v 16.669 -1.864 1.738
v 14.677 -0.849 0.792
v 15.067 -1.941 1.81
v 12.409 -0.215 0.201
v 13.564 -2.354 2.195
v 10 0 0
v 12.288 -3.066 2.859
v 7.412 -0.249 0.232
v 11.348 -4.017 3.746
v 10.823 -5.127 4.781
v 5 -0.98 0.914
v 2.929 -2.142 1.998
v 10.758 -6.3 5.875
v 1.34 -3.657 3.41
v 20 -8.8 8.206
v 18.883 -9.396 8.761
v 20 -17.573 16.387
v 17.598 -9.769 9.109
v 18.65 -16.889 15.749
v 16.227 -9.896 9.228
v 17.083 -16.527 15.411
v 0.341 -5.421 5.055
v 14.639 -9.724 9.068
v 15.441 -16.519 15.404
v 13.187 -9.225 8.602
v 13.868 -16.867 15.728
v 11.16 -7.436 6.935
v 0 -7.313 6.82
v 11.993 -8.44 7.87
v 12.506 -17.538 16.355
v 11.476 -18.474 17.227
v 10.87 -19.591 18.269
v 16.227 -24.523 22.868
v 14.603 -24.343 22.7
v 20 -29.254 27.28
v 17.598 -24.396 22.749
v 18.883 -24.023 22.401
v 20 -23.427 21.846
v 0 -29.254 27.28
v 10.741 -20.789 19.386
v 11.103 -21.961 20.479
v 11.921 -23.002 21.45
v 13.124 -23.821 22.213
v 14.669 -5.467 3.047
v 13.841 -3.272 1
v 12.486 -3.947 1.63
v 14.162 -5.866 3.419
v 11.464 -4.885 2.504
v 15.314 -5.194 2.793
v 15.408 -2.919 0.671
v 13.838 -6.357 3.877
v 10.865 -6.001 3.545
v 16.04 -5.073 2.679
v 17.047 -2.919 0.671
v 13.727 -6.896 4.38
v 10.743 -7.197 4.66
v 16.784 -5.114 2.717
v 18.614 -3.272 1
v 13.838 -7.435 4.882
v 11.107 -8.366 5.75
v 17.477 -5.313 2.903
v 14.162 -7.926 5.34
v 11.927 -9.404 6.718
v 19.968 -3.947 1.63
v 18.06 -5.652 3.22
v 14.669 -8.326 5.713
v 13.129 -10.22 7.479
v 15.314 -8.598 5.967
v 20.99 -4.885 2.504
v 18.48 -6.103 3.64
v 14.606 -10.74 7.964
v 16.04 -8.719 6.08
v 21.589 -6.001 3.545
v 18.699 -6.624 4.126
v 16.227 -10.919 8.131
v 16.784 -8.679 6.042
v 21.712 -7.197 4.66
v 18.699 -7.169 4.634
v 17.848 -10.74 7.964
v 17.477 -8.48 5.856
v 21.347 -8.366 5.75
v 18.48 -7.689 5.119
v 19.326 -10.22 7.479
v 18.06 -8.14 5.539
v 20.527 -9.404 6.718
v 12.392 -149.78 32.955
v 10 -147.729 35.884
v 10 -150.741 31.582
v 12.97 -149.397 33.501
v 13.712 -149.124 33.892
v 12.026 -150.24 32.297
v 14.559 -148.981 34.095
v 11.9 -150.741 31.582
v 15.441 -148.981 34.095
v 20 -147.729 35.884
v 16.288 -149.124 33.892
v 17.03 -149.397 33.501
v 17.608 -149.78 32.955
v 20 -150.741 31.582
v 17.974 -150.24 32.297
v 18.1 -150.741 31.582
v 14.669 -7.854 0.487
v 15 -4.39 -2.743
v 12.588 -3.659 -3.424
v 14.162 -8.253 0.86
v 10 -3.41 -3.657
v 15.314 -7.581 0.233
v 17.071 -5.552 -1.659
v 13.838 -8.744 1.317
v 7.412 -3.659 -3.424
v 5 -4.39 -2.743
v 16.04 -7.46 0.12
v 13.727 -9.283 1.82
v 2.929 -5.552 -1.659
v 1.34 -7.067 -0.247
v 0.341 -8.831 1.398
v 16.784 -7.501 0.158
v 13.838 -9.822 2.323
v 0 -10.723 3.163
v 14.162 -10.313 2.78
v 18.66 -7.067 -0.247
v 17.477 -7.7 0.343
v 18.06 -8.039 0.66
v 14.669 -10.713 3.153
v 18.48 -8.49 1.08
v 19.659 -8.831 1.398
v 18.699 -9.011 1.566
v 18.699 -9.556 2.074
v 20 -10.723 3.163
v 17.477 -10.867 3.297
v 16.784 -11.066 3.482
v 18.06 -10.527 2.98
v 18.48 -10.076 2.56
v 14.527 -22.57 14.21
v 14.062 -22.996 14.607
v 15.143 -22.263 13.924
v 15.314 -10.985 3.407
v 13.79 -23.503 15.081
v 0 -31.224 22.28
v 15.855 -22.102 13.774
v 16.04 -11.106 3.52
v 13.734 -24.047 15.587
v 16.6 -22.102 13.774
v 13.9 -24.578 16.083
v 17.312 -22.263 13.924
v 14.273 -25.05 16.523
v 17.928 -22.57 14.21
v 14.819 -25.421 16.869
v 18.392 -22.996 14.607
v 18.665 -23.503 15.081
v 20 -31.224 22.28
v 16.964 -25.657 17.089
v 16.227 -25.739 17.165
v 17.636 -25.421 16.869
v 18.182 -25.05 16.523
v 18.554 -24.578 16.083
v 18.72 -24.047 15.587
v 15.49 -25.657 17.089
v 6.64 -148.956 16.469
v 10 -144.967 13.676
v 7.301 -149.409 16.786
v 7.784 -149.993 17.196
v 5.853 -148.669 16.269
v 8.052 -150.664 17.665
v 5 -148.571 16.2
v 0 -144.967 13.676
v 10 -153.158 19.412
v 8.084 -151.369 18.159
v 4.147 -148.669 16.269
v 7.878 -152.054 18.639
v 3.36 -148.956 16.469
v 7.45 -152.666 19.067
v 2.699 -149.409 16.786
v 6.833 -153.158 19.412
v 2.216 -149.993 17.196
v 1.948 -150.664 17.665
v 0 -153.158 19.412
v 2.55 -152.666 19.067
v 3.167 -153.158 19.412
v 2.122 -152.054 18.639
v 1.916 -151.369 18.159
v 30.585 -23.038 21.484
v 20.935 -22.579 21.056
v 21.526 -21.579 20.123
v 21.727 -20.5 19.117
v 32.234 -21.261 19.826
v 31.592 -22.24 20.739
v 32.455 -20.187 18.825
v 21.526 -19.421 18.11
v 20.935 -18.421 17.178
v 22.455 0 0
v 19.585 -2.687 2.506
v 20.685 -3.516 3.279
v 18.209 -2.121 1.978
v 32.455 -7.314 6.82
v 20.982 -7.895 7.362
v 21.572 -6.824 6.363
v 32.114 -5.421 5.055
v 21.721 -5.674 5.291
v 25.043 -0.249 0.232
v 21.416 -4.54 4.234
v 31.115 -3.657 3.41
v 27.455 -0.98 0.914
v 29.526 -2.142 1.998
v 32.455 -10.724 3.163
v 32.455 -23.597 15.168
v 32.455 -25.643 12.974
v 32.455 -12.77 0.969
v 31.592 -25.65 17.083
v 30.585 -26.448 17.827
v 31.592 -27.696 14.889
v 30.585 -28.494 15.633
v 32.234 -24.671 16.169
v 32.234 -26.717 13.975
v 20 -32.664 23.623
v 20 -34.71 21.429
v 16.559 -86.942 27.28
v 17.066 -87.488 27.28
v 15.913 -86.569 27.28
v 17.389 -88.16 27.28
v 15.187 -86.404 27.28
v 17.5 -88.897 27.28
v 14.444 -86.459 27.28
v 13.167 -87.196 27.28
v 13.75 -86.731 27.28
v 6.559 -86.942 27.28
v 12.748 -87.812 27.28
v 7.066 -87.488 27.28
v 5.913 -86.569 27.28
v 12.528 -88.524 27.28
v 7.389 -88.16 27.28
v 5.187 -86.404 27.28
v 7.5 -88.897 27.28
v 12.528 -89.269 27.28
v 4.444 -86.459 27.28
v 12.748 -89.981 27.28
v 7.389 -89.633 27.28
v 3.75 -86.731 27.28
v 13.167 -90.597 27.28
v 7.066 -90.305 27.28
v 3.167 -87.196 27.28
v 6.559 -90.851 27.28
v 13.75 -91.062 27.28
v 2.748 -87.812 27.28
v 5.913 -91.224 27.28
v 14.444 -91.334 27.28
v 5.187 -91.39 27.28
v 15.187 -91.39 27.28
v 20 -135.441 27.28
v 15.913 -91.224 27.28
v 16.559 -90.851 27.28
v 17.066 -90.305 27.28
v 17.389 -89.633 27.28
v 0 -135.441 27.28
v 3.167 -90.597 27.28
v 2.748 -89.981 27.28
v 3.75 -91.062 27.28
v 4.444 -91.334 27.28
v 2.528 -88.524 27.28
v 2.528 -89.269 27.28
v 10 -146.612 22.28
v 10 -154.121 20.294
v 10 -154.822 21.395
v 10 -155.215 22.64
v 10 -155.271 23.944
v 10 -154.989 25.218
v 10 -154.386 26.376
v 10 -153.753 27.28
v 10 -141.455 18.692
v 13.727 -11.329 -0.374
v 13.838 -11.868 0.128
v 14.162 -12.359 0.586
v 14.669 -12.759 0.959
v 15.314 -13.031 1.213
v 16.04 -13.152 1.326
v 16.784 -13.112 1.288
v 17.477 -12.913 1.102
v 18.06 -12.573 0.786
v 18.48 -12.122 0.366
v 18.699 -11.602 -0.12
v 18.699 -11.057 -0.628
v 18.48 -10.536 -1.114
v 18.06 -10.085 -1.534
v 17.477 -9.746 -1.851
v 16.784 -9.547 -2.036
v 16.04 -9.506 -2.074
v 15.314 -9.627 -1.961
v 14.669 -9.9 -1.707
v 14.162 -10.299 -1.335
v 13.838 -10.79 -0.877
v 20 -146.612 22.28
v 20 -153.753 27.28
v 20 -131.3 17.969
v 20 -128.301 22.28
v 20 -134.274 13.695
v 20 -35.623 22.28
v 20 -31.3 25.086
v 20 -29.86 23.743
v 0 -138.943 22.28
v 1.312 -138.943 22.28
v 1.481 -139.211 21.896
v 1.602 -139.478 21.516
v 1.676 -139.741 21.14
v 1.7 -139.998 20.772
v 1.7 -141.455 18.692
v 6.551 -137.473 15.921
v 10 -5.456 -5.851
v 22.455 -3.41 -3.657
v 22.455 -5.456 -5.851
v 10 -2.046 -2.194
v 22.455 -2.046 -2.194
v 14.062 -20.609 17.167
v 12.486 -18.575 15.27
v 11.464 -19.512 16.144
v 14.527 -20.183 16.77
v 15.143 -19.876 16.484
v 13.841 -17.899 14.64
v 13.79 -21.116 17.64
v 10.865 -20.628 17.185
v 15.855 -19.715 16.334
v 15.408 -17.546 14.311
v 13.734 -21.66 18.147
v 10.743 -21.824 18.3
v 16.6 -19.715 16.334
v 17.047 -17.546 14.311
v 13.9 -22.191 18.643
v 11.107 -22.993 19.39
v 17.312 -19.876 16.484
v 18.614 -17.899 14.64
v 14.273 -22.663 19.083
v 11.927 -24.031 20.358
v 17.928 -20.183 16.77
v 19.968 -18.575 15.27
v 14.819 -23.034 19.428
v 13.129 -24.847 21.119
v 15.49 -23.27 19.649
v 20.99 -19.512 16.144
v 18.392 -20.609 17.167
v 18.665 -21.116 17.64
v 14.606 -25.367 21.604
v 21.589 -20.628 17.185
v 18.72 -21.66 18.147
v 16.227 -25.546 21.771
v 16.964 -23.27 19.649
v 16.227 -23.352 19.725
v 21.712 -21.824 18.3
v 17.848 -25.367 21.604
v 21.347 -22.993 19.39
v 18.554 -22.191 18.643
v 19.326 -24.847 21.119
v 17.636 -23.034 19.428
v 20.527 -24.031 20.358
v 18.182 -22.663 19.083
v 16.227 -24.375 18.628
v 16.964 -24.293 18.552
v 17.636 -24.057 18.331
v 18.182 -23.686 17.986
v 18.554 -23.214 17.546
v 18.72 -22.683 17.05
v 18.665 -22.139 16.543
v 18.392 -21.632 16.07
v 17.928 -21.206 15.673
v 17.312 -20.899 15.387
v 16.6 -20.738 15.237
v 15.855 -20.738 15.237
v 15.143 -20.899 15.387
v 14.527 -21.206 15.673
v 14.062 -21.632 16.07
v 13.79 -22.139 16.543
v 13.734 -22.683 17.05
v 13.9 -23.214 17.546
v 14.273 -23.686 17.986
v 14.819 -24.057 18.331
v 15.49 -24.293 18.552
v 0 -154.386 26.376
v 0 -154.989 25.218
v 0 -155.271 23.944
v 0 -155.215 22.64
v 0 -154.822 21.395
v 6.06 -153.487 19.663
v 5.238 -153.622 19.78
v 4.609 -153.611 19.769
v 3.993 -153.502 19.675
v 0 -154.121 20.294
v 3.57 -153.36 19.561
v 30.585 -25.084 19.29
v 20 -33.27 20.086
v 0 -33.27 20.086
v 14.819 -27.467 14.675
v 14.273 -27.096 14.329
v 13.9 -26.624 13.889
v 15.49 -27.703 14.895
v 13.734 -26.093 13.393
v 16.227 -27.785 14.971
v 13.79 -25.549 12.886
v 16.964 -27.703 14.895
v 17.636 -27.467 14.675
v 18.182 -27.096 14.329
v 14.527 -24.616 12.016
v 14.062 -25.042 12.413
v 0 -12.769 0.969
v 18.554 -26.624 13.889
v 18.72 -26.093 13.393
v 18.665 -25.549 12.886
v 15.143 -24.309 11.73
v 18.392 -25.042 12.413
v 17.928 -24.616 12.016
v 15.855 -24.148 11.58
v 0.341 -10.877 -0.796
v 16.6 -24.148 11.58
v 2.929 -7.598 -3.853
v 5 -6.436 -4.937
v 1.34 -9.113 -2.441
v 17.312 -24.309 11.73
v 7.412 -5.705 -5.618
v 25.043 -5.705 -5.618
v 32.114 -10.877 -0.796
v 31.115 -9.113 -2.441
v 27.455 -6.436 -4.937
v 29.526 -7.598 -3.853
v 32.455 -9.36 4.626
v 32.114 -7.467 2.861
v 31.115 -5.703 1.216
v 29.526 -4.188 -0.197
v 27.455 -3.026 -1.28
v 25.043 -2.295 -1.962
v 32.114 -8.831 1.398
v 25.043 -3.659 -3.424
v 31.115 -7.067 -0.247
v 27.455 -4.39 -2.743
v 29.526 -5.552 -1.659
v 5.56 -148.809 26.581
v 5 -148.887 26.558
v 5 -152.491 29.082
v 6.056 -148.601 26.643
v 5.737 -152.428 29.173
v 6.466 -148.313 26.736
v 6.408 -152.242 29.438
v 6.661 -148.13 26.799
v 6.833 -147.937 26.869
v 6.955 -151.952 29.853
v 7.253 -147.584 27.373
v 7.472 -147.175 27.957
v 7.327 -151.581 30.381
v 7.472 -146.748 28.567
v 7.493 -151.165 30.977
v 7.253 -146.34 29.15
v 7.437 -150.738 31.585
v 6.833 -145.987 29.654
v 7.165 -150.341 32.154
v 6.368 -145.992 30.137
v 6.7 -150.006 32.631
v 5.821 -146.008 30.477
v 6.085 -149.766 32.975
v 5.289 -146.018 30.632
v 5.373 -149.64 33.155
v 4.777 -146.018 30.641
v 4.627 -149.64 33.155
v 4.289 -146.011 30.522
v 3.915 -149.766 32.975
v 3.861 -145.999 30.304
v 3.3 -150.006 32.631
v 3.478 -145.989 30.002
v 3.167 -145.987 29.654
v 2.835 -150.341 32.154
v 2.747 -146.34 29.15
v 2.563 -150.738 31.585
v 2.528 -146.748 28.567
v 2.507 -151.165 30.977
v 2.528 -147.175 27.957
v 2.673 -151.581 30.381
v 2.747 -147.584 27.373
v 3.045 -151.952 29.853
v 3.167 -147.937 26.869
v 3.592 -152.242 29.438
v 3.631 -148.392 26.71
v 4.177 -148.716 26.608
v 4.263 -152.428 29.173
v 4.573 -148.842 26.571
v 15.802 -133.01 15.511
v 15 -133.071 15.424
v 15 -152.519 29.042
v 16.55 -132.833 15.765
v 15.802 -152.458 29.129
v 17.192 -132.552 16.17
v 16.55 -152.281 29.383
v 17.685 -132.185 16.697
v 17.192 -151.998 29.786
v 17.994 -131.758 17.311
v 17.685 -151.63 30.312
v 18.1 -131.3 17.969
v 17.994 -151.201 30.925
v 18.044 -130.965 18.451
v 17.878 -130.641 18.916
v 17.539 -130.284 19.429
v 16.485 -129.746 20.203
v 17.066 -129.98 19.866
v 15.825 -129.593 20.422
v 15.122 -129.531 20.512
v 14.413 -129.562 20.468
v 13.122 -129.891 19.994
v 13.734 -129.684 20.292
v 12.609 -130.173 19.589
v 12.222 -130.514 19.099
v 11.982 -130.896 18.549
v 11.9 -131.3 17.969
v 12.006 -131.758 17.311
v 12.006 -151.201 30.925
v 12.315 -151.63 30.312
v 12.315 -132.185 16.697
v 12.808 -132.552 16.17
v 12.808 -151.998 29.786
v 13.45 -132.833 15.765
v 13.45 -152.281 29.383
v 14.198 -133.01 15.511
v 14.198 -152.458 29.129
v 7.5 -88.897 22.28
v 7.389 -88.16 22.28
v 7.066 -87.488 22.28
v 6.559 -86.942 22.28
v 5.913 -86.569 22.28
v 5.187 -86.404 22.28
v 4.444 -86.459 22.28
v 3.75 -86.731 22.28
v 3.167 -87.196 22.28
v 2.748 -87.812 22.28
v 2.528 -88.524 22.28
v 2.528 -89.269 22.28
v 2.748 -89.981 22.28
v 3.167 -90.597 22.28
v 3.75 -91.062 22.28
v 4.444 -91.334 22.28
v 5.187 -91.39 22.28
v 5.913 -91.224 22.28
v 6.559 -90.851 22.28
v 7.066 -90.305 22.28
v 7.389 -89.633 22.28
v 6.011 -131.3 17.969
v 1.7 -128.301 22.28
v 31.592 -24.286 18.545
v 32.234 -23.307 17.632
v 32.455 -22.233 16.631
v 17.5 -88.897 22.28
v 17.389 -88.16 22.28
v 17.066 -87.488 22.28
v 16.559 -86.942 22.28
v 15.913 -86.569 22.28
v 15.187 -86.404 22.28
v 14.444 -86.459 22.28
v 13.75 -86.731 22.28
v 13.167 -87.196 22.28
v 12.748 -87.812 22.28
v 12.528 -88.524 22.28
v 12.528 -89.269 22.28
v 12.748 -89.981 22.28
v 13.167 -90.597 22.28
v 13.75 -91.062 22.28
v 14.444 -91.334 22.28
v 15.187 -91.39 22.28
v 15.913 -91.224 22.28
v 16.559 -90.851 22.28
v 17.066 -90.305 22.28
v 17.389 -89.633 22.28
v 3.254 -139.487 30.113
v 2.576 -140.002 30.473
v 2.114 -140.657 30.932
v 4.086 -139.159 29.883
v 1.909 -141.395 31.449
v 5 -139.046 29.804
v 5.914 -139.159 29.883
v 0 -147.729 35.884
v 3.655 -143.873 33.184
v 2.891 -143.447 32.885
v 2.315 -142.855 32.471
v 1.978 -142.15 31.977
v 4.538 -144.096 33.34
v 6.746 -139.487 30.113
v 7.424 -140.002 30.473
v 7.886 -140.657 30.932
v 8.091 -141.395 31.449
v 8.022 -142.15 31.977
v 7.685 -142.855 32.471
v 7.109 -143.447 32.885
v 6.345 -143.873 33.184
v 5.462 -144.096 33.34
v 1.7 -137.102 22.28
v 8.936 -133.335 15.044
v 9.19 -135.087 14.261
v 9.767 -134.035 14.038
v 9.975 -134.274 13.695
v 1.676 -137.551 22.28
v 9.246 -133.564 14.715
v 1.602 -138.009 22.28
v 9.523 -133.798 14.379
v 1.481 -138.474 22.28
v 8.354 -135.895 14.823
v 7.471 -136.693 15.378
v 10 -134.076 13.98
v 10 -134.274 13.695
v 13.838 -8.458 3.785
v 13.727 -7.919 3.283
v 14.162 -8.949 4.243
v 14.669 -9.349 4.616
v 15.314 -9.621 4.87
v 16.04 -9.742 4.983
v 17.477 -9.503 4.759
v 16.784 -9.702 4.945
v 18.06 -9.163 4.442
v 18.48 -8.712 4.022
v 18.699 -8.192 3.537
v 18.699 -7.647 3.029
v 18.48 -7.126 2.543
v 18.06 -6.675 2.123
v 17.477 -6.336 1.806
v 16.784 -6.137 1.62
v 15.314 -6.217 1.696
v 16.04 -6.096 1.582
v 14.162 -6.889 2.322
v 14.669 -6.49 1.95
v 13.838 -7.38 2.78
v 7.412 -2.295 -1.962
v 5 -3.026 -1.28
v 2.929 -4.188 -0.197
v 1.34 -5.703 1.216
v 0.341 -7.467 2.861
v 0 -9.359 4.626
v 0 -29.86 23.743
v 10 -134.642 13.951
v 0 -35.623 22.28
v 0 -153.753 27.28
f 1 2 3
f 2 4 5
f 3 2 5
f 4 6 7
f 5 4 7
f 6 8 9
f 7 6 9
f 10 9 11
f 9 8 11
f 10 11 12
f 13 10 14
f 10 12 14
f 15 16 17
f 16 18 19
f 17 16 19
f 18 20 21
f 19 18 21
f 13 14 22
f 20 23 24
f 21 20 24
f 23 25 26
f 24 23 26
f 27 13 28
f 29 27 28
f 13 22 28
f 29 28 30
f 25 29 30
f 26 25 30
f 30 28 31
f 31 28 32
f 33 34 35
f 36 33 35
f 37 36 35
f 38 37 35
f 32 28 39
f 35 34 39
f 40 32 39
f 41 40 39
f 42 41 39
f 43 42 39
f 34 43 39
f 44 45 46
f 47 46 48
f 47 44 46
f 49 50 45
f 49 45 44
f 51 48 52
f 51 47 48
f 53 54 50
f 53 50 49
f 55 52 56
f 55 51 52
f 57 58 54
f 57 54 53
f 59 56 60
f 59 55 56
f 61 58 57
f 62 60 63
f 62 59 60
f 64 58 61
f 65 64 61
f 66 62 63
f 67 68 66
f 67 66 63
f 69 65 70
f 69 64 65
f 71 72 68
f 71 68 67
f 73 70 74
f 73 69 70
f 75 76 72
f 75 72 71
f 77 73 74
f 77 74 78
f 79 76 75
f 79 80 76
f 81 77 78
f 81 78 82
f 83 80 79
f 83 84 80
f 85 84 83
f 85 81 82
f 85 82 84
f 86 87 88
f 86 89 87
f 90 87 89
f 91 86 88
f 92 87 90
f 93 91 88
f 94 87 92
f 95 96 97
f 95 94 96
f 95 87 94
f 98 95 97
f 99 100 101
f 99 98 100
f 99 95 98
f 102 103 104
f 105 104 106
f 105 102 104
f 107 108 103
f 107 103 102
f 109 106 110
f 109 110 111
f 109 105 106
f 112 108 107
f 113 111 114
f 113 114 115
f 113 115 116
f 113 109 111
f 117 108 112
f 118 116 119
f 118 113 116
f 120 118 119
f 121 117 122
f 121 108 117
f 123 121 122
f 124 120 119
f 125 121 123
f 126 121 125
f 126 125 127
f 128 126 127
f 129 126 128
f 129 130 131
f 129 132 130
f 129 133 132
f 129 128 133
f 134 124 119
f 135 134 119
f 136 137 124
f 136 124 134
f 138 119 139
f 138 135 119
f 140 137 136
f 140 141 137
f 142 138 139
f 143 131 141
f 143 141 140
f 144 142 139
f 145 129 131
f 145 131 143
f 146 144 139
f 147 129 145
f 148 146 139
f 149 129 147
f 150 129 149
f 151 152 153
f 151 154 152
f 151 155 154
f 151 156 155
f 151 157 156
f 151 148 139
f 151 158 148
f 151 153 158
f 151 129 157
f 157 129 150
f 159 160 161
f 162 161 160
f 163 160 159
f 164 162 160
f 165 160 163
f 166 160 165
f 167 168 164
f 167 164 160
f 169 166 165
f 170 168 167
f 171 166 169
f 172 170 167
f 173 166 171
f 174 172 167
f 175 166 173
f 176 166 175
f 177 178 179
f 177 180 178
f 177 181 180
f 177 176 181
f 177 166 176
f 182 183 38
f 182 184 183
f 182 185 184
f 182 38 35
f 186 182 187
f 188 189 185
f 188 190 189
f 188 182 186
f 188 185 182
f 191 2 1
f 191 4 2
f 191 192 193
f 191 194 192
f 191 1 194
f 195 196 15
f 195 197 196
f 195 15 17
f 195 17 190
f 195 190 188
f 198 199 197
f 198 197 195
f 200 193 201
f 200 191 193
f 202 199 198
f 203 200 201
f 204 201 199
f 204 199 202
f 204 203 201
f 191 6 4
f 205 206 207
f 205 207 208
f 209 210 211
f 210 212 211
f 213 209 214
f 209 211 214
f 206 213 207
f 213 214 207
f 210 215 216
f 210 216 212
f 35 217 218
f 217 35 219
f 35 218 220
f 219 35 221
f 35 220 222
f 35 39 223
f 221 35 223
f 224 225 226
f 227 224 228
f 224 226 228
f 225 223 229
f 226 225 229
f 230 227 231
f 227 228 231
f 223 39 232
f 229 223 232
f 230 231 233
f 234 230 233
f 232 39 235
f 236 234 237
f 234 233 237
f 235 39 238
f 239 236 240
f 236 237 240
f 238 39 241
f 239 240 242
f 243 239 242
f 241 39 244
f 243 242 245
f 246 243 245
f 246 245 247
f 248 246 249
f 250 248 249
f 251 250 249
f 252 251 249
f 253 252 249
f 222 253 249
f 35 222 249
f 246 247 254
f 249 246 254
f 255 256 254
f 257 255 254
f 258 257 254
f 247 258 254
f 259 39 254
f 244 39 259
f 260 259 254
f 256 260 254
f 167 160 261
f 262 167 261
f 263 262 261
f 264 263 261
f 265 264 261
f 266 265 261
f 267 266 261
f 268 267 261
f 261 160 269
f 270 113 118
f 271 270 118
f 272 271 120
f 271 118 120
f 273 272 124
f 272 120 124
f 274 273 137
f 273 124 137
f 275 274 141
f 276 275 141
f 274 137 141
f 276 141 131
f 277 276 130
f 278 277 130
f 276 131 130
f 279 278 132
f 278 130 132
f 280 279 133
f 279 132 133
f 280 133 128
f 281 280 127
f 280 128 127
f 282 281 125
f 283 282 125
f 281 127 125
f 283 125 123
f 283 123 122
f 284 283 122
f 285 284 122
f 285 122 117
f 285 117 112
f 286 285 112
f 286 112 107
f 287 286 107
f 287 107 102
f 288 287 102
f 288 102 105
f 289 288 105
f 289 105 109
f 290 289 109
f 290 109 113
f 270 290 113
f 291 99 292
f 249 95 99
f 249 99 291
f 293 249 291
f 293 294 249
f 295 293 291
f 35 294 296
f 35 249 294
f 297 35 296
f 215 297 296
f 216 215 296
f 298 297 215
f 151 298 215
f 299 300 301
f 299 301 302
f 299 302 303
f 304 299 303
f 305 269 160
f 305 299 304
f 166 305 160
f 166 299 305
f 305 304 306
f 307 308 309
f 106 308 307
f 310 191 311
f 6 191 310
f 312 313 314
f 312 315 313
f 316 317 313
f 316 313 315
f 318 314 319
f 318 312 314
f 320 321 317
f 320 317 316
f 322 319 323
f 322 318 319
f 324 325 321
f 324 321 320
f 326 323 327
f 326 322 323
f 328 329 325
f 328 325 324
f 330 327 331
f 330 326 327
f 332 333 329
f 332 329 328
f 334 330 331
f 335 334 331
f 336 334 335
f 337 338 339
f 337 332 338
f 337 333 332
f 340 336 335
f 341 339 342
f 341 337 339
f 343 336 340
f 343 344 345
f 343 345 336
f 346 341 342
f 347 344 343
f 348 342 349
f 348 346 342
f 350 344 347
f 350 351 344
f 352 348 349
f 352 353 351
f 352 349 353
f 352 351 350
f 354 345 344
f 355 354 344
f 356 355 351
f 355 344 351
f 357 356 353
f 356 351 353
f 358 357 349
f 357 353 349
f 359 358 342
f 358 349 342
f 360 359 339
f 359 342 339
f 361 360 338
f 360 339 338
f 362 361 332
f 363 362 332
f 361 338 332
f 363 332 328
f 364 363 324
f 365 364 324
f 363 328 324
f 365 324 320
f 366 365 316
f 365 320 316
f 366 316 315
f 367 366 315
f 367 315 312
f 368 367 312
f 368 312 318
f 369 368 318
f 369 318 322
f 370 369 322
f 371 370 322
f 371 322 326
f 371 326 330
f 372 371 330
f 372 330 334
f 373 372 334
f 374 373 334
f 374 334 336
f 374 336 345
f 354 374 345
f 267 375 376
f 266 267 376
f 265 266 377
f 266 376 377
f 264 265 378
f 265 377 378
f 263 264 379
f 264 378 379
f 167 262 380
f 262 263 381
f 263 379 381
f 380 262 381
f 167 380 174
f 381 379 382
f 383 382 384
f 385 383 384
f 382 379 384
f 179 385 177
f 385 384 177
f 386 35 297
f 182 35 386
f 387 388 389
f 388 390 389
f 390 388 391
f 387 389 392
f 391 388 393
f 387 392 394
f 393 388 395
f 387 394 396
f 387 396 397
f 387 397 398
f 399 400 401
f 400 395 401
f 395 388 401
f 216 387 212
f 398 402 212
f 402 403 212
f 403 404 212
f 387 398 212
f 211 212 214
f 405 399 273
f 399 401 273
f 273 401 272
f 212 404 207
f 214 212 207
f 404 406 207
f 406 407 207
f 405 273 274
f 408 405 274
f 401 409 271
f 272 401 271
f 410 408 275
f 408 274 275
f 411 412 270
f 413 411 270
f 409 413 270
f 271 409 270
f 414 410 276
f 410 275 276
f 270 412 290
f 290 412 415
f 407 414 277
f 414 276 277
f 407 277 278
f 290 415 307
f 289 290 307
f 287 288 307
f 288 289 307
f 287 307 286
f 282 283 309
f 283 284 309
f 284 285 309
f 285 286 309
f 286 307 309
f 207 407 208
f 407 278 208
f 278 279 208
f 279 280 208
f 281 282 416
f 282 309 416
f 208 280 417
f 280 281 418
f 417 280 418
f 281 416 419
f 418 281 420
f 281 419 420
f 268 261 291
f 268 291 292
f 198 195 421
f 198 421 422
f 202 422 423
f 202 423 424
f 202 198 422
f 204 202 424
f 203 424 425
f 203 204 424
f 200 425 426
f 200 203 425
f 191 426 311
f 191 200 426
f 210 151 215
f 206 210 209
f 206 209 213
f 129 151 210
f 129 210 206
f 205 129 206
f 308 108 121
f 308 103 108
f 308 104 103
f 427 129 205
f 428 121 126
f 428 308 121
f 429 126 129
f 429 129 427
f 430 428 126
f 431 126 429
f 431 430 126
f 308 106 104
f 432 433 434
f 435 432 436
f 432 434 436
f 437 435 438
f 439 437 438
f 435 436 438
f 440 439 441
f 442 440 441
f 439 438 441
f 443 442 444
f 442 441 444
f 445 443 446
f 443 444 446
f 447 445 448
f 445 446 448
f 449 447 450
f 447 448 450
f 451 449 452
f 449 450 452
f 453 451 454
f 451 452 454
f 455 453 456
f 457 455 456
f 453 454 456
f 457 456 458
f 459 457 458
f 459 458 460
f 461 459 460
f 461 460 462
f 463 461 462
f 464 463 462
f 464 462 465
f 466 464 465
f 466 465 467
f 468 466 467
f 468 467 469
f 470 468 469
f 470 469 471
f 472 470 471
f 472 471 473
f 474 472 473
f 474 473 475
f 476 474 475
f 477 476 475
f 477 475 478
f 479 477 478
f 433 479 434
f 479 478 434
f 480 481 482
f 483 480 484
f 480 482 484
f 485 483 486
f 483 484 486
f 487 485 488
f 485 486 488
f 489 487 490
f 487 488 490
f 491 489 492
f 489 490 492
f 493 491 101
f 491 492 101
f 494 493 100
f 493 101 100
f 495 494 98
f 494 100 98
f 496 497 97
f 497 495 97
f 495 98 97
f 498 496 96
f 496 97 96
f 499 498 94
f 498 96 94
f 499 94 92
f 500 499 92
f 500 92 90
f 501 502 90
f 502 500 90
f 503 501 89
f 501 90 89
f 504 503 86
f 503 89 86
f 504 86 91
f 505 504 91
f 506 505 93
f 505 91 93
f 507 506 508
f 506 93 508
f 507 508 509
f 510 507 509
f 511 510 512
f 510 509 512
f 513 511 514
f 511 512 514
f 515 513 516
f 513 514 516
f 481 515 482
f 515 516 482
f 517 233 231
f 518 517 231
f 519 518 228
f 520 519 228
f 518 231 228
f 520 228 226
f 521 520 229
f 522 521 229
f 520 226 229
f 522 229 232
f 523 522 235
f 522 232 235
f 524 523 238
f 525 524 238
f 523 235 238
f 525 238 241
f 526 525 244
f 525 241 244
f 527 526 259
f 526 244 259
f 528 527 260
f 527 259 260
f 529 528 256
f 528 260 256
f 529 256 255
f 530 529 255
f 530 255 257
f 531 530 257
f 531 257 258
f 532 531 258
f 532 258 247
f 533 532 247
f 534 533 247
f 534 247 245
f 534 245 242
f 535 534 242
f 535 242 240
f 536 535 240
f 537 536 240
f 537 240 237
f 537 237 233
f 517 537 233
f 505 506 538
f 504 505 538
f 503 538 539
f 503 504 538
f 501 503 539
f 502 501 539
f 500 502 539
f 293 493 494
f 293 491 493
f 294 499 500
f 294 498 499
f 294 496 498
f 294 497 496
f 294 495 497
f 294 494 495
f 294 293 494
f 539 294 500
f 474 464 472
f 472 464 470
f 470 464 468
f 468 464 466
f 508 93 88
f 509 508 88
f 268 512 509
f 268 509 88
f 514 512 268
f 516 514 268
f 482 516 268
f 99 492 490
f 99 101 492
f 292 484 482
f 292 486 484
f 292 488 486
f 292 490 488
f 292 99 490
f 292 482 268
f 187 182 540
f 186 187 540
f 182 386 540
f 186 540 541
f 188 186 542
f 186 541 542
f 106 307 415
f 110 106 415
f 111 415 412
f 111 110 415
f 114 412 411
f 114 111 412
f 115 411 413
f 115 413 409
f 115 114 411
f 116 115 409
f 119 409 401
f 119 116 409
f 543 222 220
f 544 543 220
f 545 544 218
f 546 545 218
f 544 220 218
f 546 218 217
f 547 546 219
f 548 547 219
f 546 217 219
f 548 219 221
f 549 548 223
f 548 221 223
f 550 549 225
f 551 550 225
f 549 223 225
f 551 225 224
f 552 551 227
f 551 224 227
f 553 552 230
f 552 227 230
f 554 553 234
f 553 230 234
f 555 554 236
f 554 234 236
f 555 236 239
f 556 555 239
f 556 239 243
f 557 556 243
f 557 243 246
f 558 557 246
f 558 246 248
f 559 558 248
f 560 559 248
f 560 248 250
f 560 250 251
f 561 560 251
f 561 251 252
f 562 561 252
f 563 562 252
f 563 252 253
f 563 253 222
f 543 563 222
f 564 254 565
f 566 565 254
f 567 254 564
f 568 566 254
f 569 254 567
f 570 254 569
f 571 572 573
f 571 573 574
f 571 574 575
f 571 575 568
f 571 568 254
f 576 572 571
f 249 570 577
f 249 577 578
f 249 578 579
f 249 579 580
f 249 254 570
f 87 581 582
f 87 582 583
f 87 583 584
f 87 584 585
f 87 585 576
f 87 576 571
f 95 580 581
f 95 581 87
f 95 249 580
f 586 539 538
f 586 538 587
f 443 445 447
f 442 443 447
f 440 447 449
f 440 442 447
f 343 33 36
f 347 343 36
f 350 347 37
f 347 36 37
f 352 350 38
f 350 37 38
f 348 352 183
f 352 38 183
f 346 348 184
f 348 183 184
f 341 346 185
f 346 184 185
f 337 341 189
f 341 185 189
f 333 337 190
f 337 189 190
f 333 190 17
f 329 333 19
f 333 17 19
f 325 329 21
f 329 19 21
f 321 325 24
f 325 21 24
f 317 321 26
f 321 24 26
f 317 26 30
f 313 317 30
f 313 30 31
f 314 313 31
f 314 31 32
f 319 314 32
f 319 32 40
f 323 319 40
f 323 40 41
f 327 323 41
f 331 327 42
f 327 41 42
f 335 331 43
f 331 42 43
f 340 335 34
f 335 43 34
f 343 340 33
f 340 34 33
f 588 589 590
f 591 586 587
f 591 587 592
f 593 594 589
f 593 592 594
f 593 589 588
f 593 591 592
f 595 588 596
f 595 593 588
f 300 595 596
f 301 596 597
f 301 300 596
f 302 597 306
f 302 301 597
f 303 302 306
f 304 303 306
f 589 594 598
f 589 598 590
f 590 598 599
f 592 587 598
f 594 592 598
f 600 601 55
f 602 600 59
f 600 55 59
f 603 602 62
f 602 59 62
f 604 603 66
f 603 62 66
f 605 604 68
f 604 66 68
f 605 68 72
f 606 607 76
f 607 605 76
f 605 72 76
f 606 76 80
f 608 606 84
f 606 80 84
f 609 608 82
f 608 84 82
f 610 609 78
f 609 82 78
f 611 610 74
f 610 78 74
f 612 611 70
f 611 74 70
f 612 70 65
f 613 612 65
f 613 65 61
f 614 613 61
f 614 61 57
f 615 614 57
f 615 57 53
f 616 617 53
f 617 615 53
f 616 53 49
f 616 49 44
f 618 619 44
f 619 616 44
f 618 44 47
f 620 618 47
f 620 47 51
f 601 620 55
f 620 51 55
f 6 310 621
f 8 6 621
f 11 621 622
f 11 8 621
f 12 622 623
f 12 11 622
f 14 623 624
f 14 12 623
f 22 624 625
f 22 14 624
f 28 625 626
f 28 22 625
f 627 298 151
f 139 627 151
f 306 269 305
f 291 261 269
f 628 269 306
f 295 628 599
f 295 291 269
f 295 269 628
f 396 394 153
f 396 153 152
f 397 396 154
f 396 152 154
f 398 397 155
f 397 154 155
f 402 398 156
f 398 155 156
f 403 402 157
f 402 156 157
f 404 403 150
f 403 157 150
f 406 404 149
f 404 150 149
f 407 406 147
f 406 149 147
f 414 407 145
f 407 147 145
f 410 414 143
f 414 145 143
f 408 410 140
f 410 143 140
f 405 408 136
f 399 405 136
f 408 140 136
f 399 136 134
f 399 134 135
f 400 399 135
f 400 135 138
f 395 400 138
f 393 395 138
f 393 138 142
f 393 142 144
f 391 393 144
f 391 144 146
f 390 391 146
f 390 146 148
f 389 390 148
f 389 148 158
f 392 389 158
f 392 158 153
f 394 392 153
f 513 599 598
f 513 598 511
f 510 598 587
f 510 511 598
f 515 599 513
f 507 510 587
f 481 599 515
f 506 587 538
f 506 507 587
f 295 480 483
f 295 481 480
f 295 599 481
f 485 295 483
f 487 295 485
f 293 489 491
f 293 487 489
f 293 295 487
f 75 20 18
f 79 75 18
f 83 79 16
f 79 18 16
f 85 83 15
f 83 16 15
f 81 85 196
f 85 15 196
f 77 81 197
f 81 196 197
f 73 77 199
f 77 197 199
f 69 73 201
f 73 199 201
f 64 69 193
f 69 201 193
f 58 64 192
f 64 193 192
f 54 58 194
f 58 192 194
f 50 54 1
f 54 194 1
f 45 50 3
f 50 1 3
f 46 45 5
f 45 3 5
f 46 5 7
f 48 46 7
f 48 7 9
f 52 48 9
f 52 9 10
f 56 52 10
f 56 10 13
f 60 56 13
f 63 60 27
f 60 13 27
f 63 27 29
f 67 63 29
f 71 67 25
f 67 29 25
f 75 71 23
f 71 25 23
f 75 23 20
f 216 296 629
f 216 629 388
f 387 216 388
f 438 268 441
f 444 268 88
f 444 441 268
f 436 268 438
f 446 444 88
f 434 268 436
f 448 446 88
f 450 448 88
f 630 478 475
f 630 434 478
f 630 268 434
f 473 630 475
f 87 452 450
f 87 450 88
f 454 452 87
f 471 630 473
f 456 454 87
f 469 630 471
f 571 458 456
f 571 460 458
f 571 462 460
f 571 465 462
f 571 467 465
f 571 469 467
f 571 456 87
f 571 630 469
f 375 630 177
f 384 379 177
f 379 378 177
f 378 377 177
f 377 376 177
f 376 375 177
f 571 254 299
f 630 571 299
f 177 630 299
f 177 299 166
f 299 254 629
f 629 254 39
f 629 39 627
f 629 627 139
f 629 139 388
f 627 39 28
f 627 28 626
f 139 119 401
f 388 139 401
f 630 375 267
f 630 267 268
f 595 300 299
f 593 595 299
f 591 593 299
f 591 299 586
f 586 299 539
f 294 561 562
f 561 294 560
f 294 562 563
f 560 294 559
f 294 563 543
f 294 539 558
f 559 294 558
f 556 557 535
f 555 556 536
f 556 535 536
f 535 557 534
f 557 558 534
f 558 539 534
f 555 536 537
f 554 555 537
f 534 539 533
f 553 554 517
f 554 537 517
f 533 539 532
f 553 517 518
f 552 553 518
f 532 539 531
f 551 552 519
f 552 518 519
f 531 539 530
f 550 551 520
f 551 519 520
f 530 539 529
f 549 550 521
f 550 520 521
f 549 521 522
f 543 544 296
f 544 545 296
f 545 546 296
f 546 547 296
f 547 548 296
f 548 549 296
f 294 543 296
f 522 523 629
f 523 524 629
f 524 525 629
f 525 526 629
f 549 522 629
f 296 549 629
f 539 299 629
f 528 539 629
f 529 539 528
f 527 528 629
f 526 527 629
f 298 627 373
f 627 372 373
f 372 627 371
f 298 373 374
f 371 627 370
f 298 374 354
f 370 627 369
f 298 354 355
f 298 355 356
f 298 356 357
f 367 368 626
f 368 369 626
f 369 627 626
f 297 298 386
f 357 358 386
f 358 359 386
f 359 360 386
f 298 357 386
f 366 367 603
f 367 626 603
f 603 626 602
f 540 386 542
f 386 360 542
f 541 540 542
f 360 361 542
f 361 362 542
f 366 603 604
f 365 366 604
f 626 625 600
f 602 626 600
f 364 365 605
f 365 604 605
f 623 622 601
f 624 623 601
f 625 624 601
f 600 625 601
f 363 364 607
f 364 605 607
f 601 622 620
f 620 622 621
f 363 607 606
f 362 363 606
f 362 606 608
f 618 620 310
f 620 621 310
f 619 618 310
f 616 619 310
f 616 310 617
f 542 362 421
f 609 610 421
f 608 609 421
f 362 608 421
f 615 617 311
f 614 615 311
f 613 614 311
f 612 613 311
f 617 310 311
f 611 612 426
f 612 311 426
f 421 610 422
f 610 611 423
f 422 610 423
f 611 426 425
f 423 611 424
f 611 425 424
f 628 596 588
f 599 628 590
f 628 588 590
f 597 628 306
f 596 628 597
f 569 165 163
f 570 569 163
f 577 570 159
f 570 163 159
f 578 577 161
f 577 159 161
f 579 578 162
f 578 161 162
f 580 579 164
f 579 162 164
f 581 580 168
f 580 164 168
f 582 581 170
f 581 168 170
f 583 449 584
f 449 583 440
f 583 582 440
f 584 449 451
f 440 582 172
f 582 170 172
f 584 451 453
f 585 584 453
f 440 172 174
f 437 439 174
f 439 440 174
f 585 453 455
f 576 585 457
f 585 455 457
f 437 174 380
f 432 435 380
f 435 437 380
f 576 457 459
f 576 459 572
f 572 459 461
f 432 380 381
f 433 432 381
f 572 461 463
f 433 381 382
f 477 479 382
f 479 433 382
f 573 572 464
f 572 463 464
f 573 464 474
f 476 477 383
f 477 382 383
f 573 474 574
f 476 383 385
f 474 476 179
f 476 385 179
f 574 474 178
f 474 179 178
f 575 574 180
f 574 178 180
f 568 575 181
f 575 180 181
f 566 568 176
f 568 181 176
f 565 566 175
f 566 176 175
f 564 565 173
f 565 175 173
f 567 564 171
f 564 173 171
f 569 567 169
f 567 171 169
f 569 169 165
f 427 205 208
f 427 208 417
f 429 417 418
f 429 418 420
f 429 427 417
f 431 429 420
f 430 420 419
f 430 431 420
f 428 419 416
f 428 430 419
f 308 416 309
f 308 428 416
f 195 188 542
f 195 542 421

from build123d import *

# Parameters (mm, degrees)
BOSS_EXTRUDE1_DEPTH     = 20
CUT_EXTRUDE1_DEPTH      = 173.601162969
CUT_EXTRUDE1_DEPTH_BACK = 173.601162969
BOSS_EXTRUDE2_DEPTH     = 20
BOSS_EXTRUDE4_DEPTH     = 10
SKETCH7_R               = 3.1
CUT_EXTRUDE3_DEPTH      = 161.534558428
BOSS_EXTRUDE5_DEPTH     = 10
SKETCH9_R               = 3.1
CUT_EXTRUDE4_DEPTH      = 147.401949114
CUT_EXTRUDE5_DEPTH      = 175.168303714
CUT_EXTRUDE6_DEPTH      = 10
SKETCH12_R              = 2.5
CUT_EXTRUDE7_DEPTH      = 162.946023748
FILLET3_R               = 5
FILLET4_R               = 10
SKETCH15_R              = 2.5
CUT_EXTRUDE10_DEPTH     = 5
BOSS_EXTRUDE6_DEPTH     = 3
BOSS_EXTRUDE7_START     = -5
BOSS_EXTRUDE7_DEPTH     = 3
CUT_EXTRUDE11_REACH     = 164.653
SKETCH16_4_R            = 2.5
CHAMFER1_SIZE           = 8.3
FILLET5_R               = 5
SKETCH17_R              = 5.5
CUT_EXTRUDE12_DEPTH     = 1.5
FILLET6_R               = 5


# Read off the part's stored shape, not the designer's step: Save Bodies1
# Some blends are built 0.0001 mm under size
with BuildPart() as part:
    # Sketch1 → Boss-Extrude1 (new body)
    with BuildSketch(Plane(origin=(0, 0, 0), x_dir=(0, 0, -1), z_dir=(1, 0, 0))):
        Polygon((0, 0), (-27.279934402, -29.254148065), (-27.279934402, -169.254148065), (-22.279934402, -169.254148065), (-22.279934402, -31.223700443), (3.656768508, -3.4099918), align=None)
    extrude(amount=BOSS_EXTRUDE1_DEPTH)

    # Sketch2 → Cut-Extrude1 (cut, two sides: drawn at the far end of the back side and taken through both)
    with BuildSketch(Plane(origin=(20, 0, 0), x_dir=(0, 0, -1), z_dir=(1, 0, 0)).offset(-CUT_EXTRUDE1_DEPTH_BACK)):
        Polygon((2.194061105, -2.04599508), (-23.742641806, -29.859703723), (-22.279934402, -31.223700443), (3.656768508, -3.4099918), align=None)
    extrude(amount=CUT_EXTRUDE1_DEPTH + CUT_EXTRUDE1_DEPTH_BACK, mode=Mode.SUBTRACT)

    # Sketch3 → Boss-Extrude2 (add)
    with BuildSketch(Plane(origin=(20, 0, 0), x_dir=(0, 0, -1), z_dir=(1, 0, 0))):
        Polygon((3.656768508, -3.4099918), (-22.279934402, -31.223700443), (-20.085873298, -33.269695523), (5.850829613, -5.45598688), align=None)
        Polygon((-22.279934402, -35.622538), (-20.085873298, -33.269695523), (-22.279934402, -31.223700443), align=None)
    extrude(amount=-BOSS_EXTRUDE2_DEPTH)

    # Sketch6 → Boss-Extrude4 (add)
    with BuildSketch(Plane.ZY):
        Polygon((27.279934402, -135.441491542), (27.279934402, -153.753110374), (35.883580948, -147.728772207), align=None)
        Polygon((22.279934402, -138.942529233), (13.676287857, -144.9668674), (22.279934402, -157.254148065), align=None)
    extrude(amount=-BOSS_EXTRUDE4_DEPTH)

    # Sketch7 → Cut-Extrude3 (cut, through all)
    with BuildSketch(Plane(origin=(0, -41.266885928, -58.935220882), x_dir=(-1, 0, 0), z_dir=(0, -0.5735764363510402, -0.8191520442889961))):
        with Locations(Location((-5, -134.094302237, 0), (0, 0, 90))):
            Circle(SKETCH7_R)
    extrude(amount=-CUT_EXTRUDE3_DEPTH, mode=Mode.SUBTRACT)

    # Sketch8 → Boss-Extrude5 (add)
    with BuildSketch(Plane(origin=(20, 0, 0), x_dir=(0, 0, -1), z_dir=(1, 0, 0))):
        Polygon((-35.883580948, -147.728772207), (-31.581757675, -150.74094129), (-27.279934402, -144.597300958), (-27.279934402, -135.441491542), align=None)
        Polygon((-17.969117113, -131.300075805), (-22.279934402, -137.456560924), (-22.279934402, -146.61237034), (-13.695141582, -134.273766824), align=None)
        Polygon((-27.279934402, -144.597300958), (-31.581757675, -150.74094129), (-27.279934402, -153.753110374), align=None)
        Polygon((-22.279934402, -128.300751509), (-22.279934402, -137.456560924), (-17.969117113, -131.300075805), align=None)
    extrude(amount=-BOSS_EXTRUDE5_DEPTH)

    # Sketch9 → Cut-Extrude4 (cut, through all)
    with BuildSketch(Plane(origin=(0, -115.987262137, 81.215155285), x_dir=(-1, 0, 0), z_dir=(0, -0.8191520442889961, 0.5735764363510402))):
        with Locations(Location((-15, 60.591190556, 0), (0, 0, 90))):
            Circle(SKETCH9_R)
    extrude(amount=-CUT_EXTRUDE4_DEPTH, mode=Mode.SUBTRACT)

    # Sketch10 → Cut-Extrude5 (cut, through all)
    with BuildSketch(Plane.ZY):
        Polygon((22.279934402, -157.254148065), (27.279934402, -153.753110374), (27.279934402, -169.254148065), (22.279934402, -169.254148065), align=None)
    extrude(amount=-CUT_EXTRUDE5_DEPTH, mode=Mode.SUBTRACT)

    # Sketch11 → Cut-Extrude6 (cut)
    with BuildSketch(Plane(origin=(20, 0, 0), x_dir=(0, 0, -1), z_dir=(1, 0, 0))):
        Polygon((-22.279934402, -157.254148065), (-22.279934402, -146.61237034), (-27.279934403, -153.753110374), align=None)
    extrude(amount=-CUT_EXTRUDE6_DEPTH, mode=Mode.SUBTRACT)

    # Sketch12 → Cut-Extrude7 (cut, through all)
    with BuildSketch(Plane.XY.offset(27.279934402)):
        with Locations((5, -88.896520317)):
            Circle(SKETCH12_R)
        with Locations((15, -88.896520317)):
            Circle(SKETCH12_R)
    extrude(amount=-CUT_EXTRUDE7_DEPTH, mode=Mode.SUBTRACT)

    # Fillet3
    # the kernel refuses this fillet: 5 mm, written as the material it takes off along each edge
    with BuildSketch(Plane(origin=(-12.5, -157.254148065, 22.279934402), x_dir=(0, 0.5735764363510394, 0.8191520442889965), z_dir=(1, 0, 0))) as fillet3_piece_1:
        with BuildLine():
            CenterArc((FILLET3_R, -FILLET3_R), FILLET3_R, 90, 90)
            Line((0, -FILLET3_R), (0, 0))
            Line((0, 0), (FILLET3_R, 0))
        make_face()
    extrude(amount=35, mode=Mode.SUBTRACT)

    # Fillet4
    fillet4_edges = [part.edges().sort_by_distance(p)[0] for p in [
        (0, -4.43298934, -4.753799061),
        (20, -4.43298934, -4.753799061),
        (0, -1.02299754, -1.097030552),
        (20, -1.02299754, -1.097030552),
    ]]
    fillet(fillet4_edges, radius=FILLET4_R - 0.0001)  # a hair under: the kernel refuses the full size

    # Sketch15 → Cut-Extrude10 (cut)
    with BuildSketch(Plane(origin=(0, -115.987262137, 81.215155285), x_dir=(1, 0, 0), z_dir=(0, -0.8191520442889961, 0.5735764363510402))):
        with Locations(Location((5, -61.143127027, 0), (0, 0, 270))):
            Circle(SKETCH15_R)
    extrude(amount=-CUT_EXTRUDE10_DEPTH, mode=Mode.SUBTRACT)

    # Sketch16 → Boss-Extrude6 (add)
    with BuildSketch(Plane(origin=(0, 0, 0), x_dir=(1, 0, 0), z_dir=(0, 0.6819983600624997, 0.7313537016191695))):
        with BuildLine():
            Line((20, -10), (20, -40))
            Line((20, -40), (32.454585159, -30))
            Line((32.454585159, -30), (32.454585159, -10))
            ThreePointArc((32.454585159, -10), (29.52565297, -2.928932188), (22.454585159, 0))
            Line((22.454585159, 0), (10, 0))
            ThreePointArc((10, 0), (17.071067812, -2.928932188), (20, -10))
        make_face()
    extrude(amount=-BOSS_EXTRUDE6_DEPTH)

    # Sketch16<3> → Boss-Extrude7 (add)
    with BuildSketch(Plane(origin=(0, 0, 0), x_dir=(1, 0, 0), z_dir=(0, 0.6819983600624997, 0.7313537016191695)).offset(BOSS_EXTRUDE7_START)):
        with BuildLine():
            Line((20, -10), (20, -40))
            Line((20, -40), (32.454585159, -30))
            Line((32.454585159, -30), (32.454585159, -10))
            ThreePointArc((32.454585159, -10), (29.52565297, -2.928932188), (22.454585159, 0))
            Line((22.454585159, 0), (10, 0))
            ThreePointArc((10, 0), (17.071067812, -2.928932188), (20, -10))
        make_face()
    extrude(amount=-BOSS_EXTRUDE7_DEPTH)

    # Cut-Extrude11: up to this face of the body (flat: up to its plane)
    cut_extrude11_end = Plane(part.part.faces().sort_by_distance((15.482284505, -20.226716455, 7.923098549))[0])
    # Sketch16<4> → Cut-Extrude11 (cut, up to the picked face)
    with BuildSketch(Plane(origin=(0, 0, 0), x_dir=(1, 0, 0), z_dir=(0, 0.6819983600624997, 0.7313537016191695)), mode=Mode.PRIVATE) as cut_extrude11_sk1:
        with BuildLine():
            ThreePointArc((13.727292579, -8.030447622), (16.227292579, -10.530447622), (18.727292579, -8.030447622))
            Line((18.727292579, -8.030447622), (13.727292579, -8.030447622))
        make_face()
    cut_extrude11_tool1 = split(extrude(cut_extrude11_sk1.sketch, amount=-CUT_EXTRUDE11_REACH, mode=Mode.PRIVATE), bisect_by=cut_extrude11_end, keep=Keep.BOTH, mode=Mode.PRIVATE)
    # Sketch16<4> → Cut-Extrude11 (cut, up to the picked face)
    with BuildSketch(Plane(origin=(0, 0, 0), x_dir=(1, 0, 0), z_dir=(0, 0.6819983600624997, 0.7313537016191695)), mode=Mode.PRIVATE) as cut_extrude11_sk2:
        with BuildLine():
            Line((13.727292579, -8.030447622), (18.727292579, -8.030447622))
            ThreePointArc((18.727292579, -8.030447622), (16.227292579, -5.530447622), (13.727292579, -8.030447622))
        make_face()
    cut_extrude11_tool2 = split(extrude(cut_extrude11_sk2.sketch, amount=-CUT_EXTRUDE11_REACH, mode=Mode.PRIVATE), bisect_by=cut_extrude11_end, keep=Keep.BOTH, mode=Mode.PRIVATE)
    # Sketch16<4> → Cut-Extrude11 (cut, up to the picked face)
    with BuildSketch(Plane(origin=(0, 0, 0), x_dir=(1, 0, 0), z_dir=(0, 0.6819983600624997, 0.7313537016191695)), mode=Mode.PRIVATE) as cut_extrude11_sk3:
        with BuildLine():
            ThreePointArc((13.727292579, -8.030447622), (16.227292579, -10.530447622), (18.727292579, -8.030447622))
            Line((18.727292579, -8.030447622), (13.727292579, -8.030447622))
        make_face()
    cut_extrude11_tool3 = split(extrude(cut_extrude11_sk3.sketch, amount=-CUT_EXTRUDE11_REACH, mode=Mode.PRIVATE), bisect_by=cut_extrude11_end, keep=Keep.BOTH, mode=Mode.PRIVATE)
    # Sketch16<4> → Cut-Extrude11 (cut, up to the picked face)
    with BuildSketch(Plane(origin=(0, 0, 0), x_dir=(1, 0, 0), z_dir=(0, 0.6819983600624997, 0.7313537016191695)), mode=Mode.PRIVATE) as cut_extrude11_sk4:
        with BuildLine():
            Line((13.727292579, -8.030447622), (18.727292579, -8.030447622))
            ThreePointArc((18.727292579, -8.030447622), (16.227292579, -5.530447622), (13.727292579, -8.030447622))
        make_face()
    cut_extrude11_tool4 = split(extrude(cut_extrude11_sk4.sketch, amount=-CUT_EXTRUDE11_REACH, mode=Mode.PRIVATE), bisect_by=cut_extrude11_end, keep=Keep.BOTH, mode=Mode.PRIVATE)
    # Sketch16<4> → Cut-Extrude11 (cut, up to the picked face)
    with BuildSketch(Plane(origin=(0, 0, 0), x_dir=(1, 0, 0), z_dir=(0, 0.6819983600624997, 0.7313537016191695)), mode=Mode.PRIVATE) as cut_extrude11_sk5:
        with Locations(Location((16.227292579, -28.030447622, 0), (0, 0, 270))):
            Circle(SKETCH16_4_R)
    cut_extrude11_tool5 = split(extrude(cut_extrude11_sk5.sketch, amount=-CUT_EXTRUDE11_REACH, mode=Mode.PRIVATE), bisect_by=cut_extrude11_end, keep=Keep.BOTH, mode=Mode.PRIVATE)
    add(cut_extrude11_tool1.solids().sort_by(Axis((16.227293, -6.649088, 6.200375), (0, -0.6819983600624997, -0.7313537016191695)))[0], mode=Mode.SUBTRACT)
    add(cut_extrude11_tool2.solids().sort_by(Axis((16.227293, -5.097107, 4.753129), (0, -0.6819983600624997, -0.7313537016191695)))[0], mode=Mode.SUBTRACT)
    add(cut_extrude11_tool3.solids().sort_by(Axis((16.227293, -6.649088, 6.200375), (0, -0.6819983600624997, -0.7313537016191695)))[0], mode=Mode.SUBTRACT)
    add(cut_extrude11_tool4.solids().sort_by(Axis((16.227293, -5.097107, 4.753129), (0, -0.6819983600624997, -0.7313537016191695)))[0], mode=Mode.SUBTRACT)
    add(cut_extrude11_tool5.solids().sort_by(Axis((16.227293, -20.500172, 19.116719), (0, -0.6819983600624997, -0.7313537016191695)))[0], mode=Mode.SUBTRACT)

    # Chamfer1
    chamfer1_edges = [part.edges().sort_by_distance(p)[0] for p in [
        (10, -140.198799419, 20.485794641),
        (10, -133.621640371, 22.279934402),
    ]]
    chamfer(chamfer1_edges, length=CHAMFER1_SIZE)

    # Fillet5
    # the kernel refuses this fillet: 5 mm, written as the material it adds along each edge
    with BuildSketch(Plane(origin=(-1.165308952, -140.434114663, 25.145243354), x_dir=(-0.24426096127254496, -0.7383550160762786, -0.6286242542514651), z_dir=(0.6635786184004234, 0.34543716418991527, -0.6635786184004234))) as fillet5_piece_1_section:
        with BuildLine():
            CenterArc((FILLET5_R * 0.34543716419, FILLET5_R), FILLET5_R, 231.886370385, 38.113629615)
            Line((-FILLET5_R * 0.271785890905, FILLET5_R * 0.213211781824), (0, 0))
            Line((0, 0), (FILLET5_R * 0.34543716419, 0))
        make_face()
    fillet5_piece_1 = extrude(amount=21.143866778, mode=Mode.PRIVATE)
    fillet5_piece_1 = split(fillet5_piece_1, bisect_by=Plane(origin=(-1.165308952, -143.792687167, 20.318091976), z_dir=(0, 0.5711279895091977, 0.8208610233158727)), keep=Keep.TOP, mode=Mode.PRIVATE)
    fillet5_piece_1 = split(fillet5_piece_1, bisect_by=Plane(origin=(-1.165308952, -130.915194321, 18.522292961), z_dir=(0, -0.8208610233158725, 0.5711279895091982)), keep=Keep.TOP, mode=Mode.PRIVATE)
    fillet5_piece_1 = split(fillet5_piece_1, bisect_by=Plane(origin=(-1.165308952, -138.086990978, 23.501769657), z_dir=(0, 0.8191520442889962, -0.5735764363510399)), keep=Keep.TOP, mode=Mode.PRIVATE)
    add(fillet5_piece_1)

    # Sketch17 → Cut-Extrude12 (cut)
    with BuildSketch(Plane(origin=(0, 0, 0), x_dir=(1, 0, 0), z_dir=(0, 0.6819983600624997, 0.7313537016191695))):
        with Locations(Location((16.227292579, -28.030447622, 0), (0, 0, 270))):
            Circle(SKETCH17_R)
        with Locations(Location((16.227292579, -8.030447622, 0), (0, 0, 270))):
            Circle(SKETCH17_R)
    extrude(amount=-CUT_EXTRUDE12_DEPTH, mode=Mode.SUBTRACT)

    # Fillet6
    fillet6_edges = [part.edges().sort_by_distance(p)[0] for p in [
        (32.454585159, -22.963608589, 19.362920249),
        (32.454585159, -26.373600389, 15.706151741),
    ]]
    fillet(fillet6_edges, radius=FILLET6_R)


with BuildPart() as body_2:
    # Mirror1: mirrored copy
    add(part.part.mirror(Plane(origin=(30, 0, 0), x_dir=(0, 0, 1), z_dir=(1, 0, 0))))


solid = part.part
